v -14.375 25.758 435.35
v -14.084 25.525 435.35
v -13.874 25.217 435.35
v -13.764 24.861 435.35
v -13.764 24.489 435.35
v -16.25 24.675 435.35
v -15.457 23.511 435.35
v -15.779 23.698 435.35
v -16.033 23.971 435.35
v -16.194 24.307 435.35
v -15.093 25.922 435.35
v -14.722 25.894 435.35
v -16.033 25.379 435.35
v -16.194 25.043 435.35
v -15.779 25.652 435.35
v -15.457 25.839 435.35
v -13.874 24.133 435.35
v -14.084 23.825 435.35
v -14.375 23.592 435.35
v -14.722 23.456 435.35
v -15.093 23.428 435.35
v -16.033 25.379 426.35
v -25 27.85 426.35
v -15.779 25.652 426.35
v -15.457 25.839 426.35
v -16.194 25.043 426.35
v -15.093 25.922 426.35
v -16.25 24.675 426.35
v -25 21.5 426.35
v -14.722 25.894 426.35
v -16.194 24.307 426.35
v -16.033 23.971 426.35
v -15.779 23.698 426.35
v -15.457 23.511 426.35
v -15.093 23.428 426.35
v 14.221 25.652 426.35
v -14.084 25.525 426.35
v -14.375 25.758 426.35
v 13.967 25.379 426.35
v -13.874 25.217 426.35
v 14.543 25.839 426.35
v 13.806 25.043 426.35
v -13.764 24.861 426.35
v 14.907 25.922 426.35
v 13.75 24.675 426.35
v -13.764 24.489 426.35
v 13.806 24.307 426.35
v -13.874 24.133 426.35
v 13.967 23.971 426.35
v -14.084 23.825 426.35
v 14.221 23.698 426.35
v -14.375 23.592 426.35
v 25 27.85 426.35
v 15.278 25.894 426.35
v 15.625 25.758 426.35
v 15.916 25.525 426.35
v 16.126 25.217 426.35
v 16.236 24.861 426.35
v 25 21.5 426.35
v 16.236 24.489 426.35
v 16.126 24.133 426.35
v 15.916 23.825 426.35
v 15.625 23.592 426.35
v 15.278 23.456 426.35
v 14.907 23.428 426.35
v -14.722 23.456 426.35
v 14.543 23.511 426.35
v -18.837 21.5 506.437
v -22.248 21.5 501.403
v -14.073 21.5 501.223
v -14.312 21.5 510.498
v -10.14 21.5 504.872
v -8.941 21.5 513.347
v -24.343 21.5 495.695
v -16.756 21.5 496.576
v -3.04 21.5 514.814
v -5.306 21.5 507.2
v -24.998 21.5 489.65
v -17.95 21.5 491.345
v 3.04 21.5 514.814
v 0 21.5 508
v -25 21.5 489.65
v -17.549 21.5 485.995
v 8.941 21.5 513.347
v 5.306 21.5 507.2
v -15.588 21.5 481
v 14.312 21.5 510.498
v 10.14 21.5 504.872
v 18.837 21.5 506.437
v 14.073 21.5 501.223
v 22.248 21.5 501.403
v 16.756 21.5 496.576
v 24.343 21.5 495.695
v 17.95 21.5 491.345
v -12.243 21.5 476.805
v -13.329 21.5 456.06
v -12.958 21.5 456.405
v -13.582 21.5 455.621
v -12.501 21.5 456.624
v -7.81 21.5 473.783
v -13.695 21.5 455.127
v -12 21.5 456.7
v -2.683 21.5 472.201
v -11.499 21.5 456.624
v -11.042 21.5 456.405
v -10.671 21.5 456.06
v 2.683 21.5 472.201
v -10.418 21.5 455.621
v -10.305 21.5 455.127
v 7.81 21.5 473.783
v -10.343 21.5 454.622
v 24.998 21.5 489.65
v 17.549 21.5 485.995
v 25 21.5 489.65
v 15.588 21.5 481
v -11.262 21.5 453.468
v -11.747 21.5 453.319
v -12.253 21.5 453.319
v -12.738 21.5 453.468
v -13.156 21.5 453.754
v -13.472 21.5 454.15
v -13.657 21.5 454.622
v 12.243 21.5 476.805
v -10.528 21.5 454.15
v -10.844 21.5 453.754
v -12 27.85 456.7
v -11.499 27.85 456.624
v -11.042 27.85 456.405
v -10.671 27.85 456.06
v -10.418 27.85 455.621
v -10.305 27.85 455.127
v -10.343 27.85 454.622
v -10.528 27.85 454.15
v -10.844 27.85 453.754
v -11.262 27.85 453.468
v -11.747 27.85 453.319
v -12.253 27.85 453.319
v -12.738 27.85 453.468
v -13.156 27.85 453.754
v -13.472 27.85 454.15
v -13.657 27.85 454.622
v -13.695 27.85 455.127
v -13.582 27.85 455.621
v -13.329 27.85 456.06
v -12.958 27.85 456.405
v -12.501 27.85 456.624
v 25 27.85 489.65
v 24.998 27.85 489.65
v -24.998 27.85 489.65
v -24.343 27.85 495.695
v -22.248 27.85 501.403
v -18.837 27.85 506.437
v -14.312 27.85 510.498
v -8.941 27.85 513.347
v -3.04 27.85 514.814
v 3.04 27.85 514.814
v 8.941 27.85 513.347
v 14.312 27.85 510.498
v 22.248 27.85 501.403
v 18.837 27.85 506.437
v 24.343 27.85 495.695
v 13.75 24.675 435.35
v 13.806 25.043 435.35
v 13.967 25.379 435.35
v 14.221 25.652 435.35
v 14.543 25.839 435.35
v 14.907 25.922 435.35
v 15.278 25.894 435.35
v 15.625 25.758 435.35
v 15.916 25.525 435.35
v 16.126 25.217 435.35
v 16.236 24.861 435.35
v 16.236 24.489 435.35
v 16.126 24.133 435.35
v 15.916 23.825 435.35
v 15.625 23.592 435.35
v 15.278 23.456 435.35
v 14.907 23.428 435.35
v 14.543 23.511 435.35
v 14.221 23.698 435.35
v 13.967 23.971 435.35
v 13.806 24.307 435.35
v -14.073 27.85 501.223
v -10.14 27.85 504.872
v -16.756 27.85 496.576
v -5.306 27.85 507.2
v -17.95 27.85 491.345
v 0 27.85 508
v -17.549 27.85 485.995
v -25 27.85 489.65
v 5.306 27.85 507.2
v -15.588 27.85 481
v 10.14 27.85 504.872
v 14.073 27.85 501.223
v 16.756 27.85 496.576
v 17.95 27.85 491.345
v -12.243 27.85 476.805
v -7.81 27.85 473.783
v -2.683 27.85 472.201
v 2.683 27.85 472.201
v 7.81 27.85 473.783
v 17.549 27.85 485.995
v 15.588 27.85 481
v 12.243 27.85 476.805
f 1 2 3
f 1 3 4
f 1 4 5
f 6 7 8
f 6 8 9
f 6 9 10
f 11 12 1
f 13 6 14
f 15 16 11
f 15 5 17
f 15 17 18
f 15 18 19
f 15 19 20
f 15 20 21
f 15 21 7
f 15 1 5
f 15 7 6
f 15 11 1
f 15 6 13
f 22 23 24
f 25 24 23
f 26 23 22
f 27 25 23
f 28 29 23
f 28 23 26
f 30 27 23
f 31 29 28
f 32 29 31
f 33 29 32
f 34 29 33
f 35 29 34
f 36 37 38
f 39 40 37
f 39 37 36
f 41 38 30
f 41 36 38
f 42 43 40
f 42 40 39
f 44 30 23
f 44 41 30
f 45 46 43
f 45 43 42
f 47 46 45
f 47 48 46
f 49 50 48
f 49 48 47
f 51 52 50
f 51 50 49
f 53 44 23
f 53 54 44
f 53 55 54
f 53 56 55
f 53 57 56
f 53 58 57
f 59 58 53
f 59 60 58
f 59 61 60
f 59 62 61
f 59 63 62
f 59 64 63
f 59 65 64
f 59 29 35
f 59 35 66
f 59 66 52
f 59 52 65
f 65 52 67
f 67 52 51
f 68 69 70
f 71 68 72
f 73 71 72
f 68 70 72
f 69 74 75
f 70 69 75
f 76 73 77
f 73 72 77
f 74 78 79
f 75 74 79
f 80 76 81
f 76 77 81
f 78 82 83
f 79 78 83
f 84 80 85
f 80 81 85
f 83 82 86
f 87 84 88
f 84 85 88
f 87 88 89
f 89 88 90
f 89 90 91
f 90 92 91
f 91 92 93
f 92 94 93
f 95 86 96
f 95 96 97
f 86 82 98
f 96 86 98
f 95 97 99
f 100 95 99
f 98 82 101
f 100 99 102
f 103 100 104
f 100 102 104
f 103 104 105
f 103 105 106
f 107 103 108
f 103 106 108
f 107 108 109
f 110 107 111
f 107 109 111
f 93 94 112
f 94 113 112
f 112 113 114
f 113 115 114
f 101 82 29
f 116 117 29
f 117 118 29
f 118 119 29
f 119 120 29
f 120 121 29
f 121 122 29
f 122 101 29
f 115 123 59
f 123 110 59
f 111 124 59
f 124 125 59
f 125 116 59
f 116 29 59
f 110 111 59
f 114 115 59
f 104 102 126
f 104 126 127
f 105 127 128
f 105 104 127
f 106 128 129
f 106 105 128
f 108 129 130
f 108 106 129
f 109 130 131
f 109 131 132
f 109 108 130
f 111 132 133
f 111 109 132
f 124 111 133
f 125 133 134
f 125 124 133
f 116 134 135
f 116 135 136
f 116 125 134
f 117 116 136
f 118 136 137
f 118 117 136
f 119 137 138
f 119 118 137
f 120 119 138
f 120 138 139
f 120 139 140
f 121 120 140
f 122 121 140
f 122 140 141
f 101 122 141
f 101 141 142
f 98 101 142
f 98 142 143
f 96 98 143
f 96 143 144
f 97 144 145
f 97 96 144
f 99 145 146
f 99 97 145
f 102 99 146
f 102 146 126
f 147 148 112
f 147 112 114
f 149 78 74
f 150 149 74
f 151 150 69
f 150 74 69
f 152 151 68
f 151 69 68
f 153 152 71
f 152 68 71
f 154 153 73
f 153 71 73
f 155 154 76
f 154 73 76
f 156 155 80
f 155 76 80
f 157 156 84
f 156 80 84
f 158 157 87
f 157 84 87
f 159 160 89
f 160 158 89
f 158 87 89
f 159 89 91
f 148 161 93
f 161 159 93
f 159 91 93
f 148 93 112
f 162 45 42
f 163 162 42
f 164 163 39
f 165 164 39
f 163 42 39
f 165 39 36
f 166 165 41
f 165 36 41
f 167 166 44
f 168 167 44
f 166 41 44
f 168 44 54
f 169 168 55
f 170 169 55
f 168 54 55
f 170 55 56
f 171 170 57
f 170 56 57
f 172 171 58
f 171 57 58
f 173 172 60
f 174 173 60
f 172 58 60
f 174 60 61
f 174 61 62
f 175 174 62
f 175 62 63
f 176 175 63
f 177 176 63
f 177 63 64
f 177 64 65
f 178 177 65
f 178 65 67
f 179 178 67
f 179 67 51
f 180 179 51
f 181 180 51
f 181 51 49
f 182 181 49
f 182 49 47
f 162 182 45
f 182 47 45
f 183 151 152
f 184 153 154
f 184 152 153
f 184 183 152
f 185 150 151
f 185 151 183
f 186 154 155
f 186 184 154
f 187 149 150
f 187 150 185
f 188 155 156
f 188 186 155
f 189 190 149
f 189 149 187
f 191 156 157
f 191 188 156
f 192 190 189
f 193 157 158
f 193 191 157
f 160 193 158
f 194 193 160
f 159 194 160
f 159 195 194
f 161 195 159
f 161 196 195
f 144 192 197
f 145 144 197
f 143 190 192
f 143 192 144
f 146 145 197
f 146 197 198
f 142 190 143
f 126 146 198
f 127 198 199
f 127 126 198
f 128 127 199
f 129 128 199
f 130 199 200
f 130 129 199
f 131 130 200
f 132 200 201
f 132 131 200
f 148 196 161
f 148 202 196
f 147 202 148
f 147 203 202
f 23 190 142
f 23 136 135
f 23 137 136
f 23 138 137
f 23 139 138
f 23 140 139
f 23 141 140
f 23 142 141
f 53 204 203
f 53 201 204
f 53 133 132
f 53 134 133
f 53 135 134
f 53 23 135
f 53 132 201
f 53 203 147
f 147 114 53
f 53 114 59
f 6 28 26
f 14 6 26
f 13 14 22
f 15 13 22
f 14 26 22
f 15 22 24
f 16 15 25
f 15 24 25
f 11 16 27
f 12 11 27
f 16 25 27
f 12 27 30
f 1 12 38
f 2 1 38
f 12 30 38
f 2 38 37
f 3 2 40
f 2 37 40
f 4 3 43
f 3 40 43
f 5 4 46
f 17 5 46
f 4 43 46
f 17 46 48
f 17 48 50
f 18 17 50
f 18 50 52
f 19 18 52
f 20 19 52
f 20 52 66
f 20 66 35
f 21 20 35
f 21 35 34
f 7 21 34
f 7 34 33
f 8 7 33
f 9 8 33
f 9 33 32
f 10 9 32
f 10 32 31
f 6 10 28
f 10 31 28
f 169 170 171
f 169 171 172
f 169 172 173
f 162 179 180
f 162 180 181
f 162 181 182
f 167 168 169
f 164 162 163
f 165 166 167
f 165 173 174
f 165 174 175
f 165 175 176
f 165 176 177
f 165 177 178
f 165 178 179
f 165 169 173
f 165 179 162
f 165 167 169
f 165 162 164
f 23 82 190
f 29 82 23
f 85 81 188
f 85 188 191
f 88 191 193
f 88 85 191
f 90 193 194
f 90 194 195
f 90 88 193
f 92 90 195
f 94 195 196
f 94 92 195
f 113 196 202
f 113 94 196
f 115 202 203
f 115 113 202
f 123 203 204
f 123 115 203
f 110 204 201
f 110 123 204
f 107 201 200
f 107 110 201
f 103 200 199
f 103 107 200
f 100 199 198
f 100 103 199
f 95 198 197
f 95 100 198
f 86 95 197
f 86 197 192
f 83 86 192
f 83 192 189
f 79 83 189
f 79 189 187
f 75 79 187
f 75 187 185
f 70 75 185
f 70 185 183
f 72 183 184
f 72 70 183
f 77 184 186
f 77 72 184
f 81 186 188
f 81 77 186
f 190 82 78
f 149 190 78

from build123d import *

# Parameters (mm, degrees)
PARED_START                = 21.5
SK_PARED_W                 = 50
SK_PARED_H                 = 63.3
PARED_DEPTH                = 6.35
CABEZA_START               = 21.5
SK_CABEZA_R                = 25
CABEZA_DEPTH               = 6.35
PASO_CUBO_J5_START         = 21.5
SK_PASO_CUBO_J5_R          = 18
PASO_CUBO_J5_DEPTH         = 6.35
PASANTE_M3_CINCHO_START    = 21.5
SK_PASANTE_M3_CINCHO_R     = 1.7
PASANTE_M3_CINCHO_DEPTH    = 6.35
SK_ROSCA_M3_DESDE_ABAJO_R  = 1.25
ROSCA_M3_DESDE_ABAJO_DEPTH = 9


with BuildPart() as part:
    # Sk_Pared → Pared (new body)
    with BuildSketch(Plane(origin=(0, 0, 0), x_dir=(1, 0, 0), z_dir=(0, 1, 0)).offset(PARED_START)):
        with Locations((0, -458)):
            Rectangle(SK_PARED_W, SK_PARED_H)
    extrude(amount=PARED_DEPTH)

    # Sk_Cabeza → Cabeza (add)
    with BuildSketch(Plane(origin=(0, 0, 0), x_dir=(1, 0, 0), z_dir=(0, 1, 0)).offset(CABEZA_START)):
        with Locations((0, -490)):
            Circle(SK_CABEZA_R)
    extrude(amount=CABEZA_DEPTH)

    # Sk_Paso_cubo_J5 → Paso_cubo_J5 (cut)
    with BuildSketch(Plane(origin=(0, 0, 0), x_dir=(1, 0, 0), z_dir=(0, 1, 0)).offset(PASO_CUBO_J5_START)):
        with Locations(Location((0, -490, 0), (0, 0, 270))):
            Circle(SK_PASO_CUBO_J5_R)
    extrude(amount=PASO_CUBO_J5_DEPTH, mode=Mode.SUBTRACT)

    # Sk_Pasante_M3_cincho → Pasante_M3_cincho (cut)
    with BuildSketch(Plane(origin=(0, 0, 0), x_dir=(1, 0, 0), z_dir=(0, 1, 0)).offset(PASANTE_M3_CINCHO_START)):
        with Locations(Location((-12, -455, 0), (0, 0, 270))):
            Circle(SK_PASANTE_M3_CINCHO_R)
    extrude(amount=PASANTE_M3_CINCHO_DEPTH, mode=Mode.SUBTRACT)

    # Sk_Rosca_M3_desde_abajo → Rosca_M3_desde_abajo (cut)
    with BuildSketch(Plane(origin=(0, 0, 426.35), x_dir=(-1, 0, 0), z_dir=(0, 0, -1))):
        with Locations((15, 24.675)):
            Circle(SK_ROSCA_M3_DESDE_ABAJO_R)
        with Locations((-15, 24.675)):
            Circle(SK_ROSCA_M3_DESDE_ABAJO_R)
    extrude(amount=-ROSCA_M3_DESDE_ABAJO_DEPTH, mode=Mode.SUBTRACT)


solid = part.part
